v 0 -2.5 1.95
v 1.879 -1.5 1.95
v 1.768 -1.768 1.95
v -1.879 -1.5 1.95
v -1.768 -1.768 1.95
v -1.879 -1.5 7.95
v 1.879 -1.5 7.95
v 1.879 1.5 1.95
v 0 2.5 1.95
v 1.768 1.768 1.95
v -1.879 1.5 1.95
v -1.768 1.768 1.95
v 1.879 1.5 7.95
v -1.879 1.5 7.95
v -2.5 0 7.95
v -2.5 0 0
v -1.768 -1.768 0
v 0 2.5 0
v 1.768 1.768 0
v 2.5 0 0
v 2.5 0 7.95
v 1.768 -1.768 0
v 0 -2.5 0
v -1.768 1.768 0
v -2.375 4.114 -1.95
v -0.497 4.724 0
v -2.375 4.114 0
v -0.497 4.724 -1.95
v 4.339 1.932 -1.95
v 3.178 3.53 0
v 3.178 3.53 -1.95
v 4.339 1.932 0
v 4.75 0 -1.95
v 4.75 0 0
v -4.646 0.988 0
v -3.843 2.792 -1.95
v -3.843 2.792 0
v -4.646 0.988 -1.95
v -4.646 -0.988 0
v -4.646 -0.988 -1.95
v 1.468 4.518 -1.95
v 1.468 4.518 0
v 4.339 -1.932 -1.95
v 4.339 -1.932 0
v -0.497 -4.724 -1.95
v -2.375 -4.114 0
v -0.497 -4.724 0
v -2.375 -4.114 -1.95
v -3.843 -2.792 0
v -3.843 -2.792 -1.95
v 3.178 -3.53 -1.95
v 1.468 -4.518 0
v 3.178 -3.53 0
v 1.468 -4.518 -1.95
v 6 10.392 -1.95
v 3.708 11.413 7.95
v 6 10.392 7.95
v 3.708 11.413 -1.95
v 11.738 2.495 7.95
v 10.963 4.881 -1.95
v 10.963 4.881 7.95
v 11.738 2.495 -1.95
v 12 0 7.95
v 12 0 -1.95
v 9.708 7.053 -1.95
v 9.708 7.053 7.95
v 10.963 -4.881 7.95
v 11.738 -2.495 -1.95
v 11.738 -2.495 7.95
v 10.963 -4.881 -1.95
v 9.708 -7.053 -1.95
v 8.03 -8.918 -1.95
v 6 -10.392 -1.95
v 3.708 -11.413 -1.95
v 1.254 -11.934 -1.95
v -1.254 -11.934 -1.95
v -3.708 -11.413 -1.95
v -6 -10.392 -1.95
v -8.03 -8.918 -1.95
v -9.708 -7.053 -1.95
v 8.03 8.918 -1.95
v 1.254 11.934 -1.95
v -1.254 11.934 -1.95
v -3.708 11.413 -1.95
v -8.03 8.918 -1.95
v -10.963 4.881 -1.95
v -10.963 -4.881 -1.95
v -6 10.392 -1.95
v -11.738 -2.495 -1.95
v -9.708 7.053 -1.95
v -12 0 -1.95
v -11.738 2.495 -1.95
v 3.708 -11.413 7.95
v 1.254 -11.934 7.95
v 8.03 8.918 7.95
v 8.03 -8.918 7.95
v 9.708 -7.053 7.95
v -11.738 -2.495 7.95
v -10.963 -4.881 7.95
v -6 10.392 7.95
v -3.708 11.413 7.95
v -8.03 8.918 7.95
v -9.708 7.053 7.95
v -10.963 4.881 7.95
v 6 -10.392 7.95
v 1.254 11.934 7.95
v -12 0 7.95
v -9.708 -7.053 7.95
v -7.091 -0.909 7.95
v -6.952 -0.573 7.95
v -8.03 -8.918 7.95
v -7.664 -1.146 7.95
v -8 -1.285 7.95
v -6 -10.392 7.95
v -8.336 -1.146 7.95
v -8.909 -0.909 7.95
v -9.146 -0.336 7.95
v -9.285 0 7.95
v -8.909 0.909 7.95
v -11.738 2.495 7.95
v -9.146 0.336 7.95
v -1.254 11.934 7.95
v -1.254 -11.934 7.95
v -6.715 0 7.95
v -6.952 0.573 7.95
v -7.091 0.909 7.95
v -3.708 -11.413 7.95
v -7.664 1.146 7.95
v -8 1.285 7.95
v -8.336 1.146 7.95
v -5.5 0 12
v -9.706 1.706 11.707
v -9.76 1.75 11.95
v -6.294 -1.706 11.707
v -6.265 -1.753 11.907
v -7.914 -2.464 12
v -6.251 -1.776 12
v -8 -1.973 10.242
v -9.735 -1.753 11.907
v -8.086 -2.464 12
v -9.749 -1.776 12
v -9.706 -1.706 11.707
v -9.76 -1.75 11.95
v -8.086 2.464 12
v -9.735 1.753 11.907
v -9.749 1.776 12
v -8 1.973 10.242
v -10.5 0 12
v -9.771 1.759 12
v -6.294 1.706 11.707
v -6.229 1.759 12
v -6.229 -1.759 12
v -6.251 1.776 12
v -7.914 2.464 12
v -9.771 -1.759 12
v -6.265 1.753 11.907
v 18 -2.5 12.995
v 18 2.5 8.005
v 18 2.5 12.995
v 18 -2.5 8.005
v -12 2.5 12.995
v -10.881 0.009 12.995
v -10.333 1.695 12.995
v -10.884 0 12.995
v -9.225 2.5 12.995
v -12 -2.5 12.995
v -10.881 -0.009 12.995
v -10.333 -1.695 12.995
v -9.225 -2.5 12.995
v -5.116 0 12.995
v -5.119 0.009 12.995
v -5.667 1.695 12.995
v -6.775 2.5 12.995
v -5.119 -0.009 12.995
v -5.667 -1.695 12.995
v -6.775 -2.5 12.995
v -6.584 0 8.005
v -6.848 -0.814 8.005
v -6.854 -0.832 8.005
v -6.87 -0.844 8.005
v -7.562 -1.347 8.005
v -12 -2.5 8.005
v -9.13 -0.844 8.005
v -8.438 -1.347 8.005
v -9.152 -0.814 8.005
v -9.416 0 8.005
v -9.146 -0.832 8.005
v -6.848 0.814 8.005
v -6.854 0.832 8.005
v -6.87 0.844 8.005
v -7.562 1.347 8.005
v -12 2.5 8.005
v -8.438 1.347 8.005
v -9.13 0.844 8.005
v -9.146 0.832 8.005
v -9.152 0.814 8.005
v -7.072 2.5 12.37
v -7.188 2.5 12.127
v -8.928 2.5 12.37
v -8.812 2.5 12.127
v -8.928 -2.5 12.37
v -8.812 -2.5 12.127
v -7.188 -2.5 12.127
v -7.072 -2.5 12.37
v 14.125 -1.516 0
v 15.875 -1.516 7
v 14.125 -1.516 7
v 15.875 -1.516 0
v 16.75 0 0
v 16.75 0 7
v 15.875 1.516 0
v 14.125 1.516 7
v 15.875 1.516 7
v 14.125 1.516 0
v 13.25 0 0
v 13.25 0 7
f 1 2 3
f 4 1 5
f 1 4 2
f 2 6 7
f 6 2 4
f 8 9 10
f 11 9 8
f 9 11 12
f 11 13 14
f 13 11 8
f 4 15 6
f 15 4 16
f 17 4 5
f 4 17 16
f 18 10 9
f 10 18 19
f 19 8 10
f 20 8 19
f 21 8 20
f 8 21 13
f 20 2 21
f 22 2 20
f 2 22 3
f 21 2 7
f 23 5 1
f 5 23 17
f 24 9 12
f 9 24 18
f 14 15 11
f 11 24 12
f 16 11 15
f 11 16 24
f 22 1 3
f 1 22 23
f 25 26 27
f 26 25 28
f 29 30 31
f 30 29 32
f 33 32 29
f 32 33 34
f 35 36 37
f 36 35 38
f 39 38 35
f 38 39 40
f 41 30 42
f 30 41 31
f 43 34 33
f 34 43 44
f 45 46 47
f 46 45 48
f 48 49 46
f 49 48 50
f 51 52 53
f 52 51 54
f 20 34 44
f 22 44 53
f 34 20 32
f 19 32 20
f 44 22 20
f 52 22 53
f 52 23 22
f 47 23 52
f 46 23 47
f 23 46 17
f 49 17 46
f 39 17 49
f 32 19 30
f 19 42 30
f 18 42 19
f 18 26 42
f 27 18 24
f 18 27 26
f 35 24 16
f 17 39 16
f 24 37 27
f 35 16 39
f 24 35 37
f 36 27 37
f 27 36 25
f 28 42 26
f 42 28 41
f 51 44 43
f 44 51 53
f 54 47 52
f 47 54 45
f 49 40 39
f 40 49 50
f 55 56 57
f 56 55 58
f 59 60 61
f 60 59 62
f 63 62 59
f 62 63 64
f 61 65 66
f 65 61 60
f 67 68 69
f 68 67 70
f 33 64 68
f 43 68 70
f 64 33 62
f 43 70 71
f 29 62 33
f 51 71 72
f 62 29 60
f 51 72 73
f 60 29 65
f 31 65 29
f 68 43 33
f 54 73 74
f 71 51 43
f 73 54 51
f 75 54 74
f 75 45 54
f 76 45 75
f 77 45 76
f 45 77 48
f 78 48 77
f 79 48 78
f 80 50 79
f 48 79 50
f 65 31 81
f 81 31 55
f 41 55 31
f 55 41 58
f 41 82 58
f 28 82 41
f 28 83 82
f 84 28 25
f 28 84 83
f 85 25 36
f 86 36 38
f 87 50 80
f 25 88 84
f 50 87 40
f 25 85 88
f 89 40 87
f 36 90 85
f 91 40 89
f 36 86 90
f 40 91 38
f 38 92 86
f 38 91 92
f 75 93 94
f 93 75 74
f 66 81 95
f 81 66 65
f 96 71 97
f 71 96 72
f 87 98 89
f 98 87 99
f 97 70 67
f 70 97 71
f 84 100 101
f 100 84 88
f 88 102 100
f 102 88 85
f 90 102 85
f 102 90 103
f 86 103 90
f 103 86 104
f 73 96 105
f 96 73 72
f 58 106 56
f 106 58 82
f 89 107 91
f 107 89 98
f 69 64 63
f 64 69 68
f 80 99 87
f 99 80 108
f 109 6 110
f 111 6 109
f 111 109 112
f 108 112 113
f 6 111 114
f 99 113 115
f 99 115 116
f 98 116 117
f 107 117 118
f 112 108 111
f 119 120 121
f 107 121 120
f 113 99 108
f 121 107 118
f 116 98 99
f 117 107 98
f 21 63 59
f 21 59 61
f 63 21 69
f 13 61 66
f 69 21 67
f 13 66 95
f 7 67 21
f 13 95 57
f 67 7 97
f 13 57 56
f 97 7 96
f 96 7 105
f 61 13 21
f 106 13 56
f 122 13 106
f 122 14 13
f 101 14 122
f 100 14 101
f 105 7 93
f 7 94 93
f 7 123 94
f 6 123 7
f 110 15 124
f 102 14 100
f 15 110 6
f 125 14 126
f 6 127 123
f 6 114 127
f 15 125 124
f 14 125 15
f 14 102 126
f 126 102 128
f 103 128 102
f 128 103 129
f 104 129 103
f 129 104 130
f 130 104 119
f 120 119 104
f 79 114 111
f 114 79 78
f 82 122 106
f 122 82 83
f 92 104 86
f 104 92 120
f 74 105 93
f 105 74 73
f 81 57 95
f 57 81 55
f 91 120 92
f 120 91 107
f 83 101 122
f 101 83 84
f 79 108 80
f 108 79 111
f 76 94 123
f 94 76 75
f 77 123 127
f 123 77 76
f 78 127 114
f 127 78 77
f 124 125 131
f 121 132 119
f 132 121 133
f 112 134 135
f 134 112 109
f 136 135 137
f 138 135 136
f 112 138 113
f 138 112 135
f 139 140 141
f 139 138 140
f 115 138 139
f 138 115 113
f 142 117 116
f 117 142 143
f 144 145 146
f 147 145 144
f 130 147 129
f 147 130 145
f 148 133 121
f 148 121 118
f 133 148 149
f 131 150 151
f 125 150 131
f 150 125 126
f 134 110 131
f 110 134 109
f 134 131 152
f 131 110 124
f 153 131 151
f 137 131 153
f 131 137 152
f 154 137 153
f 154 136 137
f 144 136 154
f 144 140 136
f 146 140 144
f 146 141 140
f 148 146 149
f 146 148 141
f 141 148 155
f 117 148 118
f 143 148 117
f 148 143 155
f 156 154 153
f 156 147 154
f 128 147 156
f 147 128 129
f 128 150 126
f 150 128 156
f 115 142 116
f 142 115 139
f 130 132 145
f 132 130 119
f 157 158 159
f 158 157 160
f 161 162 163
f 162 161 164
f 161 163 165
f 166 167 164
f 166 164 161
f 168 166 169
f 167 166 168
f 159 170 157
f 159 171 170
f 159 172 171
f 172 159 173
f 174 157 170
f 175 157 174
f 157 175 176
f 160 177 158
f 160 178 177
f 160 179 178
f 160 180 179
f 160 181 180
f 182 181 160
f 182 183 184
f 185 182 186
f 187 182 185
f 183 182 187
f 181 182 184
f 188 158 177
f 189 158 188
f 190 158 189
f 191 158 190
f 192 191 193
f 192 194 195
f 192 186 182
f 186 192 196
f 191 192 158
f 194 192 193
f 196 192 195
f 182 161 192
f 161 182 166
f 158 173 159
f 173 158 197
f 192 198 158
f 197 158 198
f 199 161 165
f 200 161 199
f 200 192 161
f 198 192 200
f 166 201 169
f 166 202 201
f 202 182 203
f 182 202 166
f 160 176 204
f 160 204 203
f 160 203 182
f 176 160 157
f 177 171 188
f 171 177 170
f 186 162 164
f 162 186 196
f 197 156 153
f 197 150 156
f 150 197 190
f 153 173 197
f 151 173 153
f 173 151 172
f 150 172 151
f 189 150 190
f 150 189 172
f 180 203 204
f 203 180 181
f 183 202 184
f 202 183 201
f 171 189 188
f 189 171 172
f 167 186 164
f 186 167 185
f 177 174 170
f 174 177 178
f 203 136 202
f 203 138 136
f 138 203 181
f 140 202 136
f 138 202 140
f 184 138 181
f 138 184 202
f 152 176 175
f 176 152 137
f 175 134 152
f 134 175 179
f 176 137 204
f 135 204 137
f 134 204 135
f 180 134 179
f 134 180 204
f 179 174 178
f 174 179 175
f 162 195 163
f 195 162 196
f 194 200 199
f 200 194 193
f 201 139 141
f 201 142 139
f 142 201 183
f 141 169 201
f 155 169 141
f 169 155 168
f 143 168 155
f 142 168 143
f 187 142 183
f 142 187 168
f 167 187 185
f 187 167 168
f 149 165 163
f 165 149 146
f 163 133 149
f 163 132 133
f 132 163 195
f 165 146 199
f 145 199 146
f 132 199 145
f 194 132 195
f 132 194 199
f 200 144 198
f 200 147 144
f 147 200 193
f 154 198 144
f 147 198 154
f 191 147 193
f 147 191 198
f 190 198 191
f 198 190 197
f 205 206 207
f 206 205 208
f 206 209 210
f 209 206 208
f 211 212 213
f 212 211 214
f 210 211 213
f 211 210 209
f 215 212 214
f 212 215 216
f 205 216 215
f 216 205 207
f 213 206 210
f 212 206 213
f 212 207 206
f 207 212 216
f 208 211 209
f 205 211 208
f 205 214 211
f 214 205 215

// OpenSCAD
module slice(x){
	translate([0,2*x,4+3])
	cube([5,1,6.1],center=true);
}

module slices(){
	slice(-1);
	slice(1);
}

module shaft(){
	difference(){
		cylinder(h = 10, r = 2.5);
		slices();
	}
	cylinder(h = 2, r = 4.75); 
}

module spinner(){
	difference(){
		translate([0,0,0.05])
		cylinder(h = 9.9, r = 12);
		shaft();
	}
}

module base(){
	spinner();
	translate([-8,0,9])
	cylinder(5 ,r1 = 1,r2 = 2.5);
}

translate([0,0,-2])
base();
translate([0,0,10.5])
difference(){
	translate([3,0,0])
	cube([30, 5, 4.99],center=true);
	translate([-8,0,-2.55])
	cylinder(5.1 ,r1 = 1.4,r2 = 2.9);
}
translate([15,0,0])
cylinder(h = 7, r = 3.5/2);
